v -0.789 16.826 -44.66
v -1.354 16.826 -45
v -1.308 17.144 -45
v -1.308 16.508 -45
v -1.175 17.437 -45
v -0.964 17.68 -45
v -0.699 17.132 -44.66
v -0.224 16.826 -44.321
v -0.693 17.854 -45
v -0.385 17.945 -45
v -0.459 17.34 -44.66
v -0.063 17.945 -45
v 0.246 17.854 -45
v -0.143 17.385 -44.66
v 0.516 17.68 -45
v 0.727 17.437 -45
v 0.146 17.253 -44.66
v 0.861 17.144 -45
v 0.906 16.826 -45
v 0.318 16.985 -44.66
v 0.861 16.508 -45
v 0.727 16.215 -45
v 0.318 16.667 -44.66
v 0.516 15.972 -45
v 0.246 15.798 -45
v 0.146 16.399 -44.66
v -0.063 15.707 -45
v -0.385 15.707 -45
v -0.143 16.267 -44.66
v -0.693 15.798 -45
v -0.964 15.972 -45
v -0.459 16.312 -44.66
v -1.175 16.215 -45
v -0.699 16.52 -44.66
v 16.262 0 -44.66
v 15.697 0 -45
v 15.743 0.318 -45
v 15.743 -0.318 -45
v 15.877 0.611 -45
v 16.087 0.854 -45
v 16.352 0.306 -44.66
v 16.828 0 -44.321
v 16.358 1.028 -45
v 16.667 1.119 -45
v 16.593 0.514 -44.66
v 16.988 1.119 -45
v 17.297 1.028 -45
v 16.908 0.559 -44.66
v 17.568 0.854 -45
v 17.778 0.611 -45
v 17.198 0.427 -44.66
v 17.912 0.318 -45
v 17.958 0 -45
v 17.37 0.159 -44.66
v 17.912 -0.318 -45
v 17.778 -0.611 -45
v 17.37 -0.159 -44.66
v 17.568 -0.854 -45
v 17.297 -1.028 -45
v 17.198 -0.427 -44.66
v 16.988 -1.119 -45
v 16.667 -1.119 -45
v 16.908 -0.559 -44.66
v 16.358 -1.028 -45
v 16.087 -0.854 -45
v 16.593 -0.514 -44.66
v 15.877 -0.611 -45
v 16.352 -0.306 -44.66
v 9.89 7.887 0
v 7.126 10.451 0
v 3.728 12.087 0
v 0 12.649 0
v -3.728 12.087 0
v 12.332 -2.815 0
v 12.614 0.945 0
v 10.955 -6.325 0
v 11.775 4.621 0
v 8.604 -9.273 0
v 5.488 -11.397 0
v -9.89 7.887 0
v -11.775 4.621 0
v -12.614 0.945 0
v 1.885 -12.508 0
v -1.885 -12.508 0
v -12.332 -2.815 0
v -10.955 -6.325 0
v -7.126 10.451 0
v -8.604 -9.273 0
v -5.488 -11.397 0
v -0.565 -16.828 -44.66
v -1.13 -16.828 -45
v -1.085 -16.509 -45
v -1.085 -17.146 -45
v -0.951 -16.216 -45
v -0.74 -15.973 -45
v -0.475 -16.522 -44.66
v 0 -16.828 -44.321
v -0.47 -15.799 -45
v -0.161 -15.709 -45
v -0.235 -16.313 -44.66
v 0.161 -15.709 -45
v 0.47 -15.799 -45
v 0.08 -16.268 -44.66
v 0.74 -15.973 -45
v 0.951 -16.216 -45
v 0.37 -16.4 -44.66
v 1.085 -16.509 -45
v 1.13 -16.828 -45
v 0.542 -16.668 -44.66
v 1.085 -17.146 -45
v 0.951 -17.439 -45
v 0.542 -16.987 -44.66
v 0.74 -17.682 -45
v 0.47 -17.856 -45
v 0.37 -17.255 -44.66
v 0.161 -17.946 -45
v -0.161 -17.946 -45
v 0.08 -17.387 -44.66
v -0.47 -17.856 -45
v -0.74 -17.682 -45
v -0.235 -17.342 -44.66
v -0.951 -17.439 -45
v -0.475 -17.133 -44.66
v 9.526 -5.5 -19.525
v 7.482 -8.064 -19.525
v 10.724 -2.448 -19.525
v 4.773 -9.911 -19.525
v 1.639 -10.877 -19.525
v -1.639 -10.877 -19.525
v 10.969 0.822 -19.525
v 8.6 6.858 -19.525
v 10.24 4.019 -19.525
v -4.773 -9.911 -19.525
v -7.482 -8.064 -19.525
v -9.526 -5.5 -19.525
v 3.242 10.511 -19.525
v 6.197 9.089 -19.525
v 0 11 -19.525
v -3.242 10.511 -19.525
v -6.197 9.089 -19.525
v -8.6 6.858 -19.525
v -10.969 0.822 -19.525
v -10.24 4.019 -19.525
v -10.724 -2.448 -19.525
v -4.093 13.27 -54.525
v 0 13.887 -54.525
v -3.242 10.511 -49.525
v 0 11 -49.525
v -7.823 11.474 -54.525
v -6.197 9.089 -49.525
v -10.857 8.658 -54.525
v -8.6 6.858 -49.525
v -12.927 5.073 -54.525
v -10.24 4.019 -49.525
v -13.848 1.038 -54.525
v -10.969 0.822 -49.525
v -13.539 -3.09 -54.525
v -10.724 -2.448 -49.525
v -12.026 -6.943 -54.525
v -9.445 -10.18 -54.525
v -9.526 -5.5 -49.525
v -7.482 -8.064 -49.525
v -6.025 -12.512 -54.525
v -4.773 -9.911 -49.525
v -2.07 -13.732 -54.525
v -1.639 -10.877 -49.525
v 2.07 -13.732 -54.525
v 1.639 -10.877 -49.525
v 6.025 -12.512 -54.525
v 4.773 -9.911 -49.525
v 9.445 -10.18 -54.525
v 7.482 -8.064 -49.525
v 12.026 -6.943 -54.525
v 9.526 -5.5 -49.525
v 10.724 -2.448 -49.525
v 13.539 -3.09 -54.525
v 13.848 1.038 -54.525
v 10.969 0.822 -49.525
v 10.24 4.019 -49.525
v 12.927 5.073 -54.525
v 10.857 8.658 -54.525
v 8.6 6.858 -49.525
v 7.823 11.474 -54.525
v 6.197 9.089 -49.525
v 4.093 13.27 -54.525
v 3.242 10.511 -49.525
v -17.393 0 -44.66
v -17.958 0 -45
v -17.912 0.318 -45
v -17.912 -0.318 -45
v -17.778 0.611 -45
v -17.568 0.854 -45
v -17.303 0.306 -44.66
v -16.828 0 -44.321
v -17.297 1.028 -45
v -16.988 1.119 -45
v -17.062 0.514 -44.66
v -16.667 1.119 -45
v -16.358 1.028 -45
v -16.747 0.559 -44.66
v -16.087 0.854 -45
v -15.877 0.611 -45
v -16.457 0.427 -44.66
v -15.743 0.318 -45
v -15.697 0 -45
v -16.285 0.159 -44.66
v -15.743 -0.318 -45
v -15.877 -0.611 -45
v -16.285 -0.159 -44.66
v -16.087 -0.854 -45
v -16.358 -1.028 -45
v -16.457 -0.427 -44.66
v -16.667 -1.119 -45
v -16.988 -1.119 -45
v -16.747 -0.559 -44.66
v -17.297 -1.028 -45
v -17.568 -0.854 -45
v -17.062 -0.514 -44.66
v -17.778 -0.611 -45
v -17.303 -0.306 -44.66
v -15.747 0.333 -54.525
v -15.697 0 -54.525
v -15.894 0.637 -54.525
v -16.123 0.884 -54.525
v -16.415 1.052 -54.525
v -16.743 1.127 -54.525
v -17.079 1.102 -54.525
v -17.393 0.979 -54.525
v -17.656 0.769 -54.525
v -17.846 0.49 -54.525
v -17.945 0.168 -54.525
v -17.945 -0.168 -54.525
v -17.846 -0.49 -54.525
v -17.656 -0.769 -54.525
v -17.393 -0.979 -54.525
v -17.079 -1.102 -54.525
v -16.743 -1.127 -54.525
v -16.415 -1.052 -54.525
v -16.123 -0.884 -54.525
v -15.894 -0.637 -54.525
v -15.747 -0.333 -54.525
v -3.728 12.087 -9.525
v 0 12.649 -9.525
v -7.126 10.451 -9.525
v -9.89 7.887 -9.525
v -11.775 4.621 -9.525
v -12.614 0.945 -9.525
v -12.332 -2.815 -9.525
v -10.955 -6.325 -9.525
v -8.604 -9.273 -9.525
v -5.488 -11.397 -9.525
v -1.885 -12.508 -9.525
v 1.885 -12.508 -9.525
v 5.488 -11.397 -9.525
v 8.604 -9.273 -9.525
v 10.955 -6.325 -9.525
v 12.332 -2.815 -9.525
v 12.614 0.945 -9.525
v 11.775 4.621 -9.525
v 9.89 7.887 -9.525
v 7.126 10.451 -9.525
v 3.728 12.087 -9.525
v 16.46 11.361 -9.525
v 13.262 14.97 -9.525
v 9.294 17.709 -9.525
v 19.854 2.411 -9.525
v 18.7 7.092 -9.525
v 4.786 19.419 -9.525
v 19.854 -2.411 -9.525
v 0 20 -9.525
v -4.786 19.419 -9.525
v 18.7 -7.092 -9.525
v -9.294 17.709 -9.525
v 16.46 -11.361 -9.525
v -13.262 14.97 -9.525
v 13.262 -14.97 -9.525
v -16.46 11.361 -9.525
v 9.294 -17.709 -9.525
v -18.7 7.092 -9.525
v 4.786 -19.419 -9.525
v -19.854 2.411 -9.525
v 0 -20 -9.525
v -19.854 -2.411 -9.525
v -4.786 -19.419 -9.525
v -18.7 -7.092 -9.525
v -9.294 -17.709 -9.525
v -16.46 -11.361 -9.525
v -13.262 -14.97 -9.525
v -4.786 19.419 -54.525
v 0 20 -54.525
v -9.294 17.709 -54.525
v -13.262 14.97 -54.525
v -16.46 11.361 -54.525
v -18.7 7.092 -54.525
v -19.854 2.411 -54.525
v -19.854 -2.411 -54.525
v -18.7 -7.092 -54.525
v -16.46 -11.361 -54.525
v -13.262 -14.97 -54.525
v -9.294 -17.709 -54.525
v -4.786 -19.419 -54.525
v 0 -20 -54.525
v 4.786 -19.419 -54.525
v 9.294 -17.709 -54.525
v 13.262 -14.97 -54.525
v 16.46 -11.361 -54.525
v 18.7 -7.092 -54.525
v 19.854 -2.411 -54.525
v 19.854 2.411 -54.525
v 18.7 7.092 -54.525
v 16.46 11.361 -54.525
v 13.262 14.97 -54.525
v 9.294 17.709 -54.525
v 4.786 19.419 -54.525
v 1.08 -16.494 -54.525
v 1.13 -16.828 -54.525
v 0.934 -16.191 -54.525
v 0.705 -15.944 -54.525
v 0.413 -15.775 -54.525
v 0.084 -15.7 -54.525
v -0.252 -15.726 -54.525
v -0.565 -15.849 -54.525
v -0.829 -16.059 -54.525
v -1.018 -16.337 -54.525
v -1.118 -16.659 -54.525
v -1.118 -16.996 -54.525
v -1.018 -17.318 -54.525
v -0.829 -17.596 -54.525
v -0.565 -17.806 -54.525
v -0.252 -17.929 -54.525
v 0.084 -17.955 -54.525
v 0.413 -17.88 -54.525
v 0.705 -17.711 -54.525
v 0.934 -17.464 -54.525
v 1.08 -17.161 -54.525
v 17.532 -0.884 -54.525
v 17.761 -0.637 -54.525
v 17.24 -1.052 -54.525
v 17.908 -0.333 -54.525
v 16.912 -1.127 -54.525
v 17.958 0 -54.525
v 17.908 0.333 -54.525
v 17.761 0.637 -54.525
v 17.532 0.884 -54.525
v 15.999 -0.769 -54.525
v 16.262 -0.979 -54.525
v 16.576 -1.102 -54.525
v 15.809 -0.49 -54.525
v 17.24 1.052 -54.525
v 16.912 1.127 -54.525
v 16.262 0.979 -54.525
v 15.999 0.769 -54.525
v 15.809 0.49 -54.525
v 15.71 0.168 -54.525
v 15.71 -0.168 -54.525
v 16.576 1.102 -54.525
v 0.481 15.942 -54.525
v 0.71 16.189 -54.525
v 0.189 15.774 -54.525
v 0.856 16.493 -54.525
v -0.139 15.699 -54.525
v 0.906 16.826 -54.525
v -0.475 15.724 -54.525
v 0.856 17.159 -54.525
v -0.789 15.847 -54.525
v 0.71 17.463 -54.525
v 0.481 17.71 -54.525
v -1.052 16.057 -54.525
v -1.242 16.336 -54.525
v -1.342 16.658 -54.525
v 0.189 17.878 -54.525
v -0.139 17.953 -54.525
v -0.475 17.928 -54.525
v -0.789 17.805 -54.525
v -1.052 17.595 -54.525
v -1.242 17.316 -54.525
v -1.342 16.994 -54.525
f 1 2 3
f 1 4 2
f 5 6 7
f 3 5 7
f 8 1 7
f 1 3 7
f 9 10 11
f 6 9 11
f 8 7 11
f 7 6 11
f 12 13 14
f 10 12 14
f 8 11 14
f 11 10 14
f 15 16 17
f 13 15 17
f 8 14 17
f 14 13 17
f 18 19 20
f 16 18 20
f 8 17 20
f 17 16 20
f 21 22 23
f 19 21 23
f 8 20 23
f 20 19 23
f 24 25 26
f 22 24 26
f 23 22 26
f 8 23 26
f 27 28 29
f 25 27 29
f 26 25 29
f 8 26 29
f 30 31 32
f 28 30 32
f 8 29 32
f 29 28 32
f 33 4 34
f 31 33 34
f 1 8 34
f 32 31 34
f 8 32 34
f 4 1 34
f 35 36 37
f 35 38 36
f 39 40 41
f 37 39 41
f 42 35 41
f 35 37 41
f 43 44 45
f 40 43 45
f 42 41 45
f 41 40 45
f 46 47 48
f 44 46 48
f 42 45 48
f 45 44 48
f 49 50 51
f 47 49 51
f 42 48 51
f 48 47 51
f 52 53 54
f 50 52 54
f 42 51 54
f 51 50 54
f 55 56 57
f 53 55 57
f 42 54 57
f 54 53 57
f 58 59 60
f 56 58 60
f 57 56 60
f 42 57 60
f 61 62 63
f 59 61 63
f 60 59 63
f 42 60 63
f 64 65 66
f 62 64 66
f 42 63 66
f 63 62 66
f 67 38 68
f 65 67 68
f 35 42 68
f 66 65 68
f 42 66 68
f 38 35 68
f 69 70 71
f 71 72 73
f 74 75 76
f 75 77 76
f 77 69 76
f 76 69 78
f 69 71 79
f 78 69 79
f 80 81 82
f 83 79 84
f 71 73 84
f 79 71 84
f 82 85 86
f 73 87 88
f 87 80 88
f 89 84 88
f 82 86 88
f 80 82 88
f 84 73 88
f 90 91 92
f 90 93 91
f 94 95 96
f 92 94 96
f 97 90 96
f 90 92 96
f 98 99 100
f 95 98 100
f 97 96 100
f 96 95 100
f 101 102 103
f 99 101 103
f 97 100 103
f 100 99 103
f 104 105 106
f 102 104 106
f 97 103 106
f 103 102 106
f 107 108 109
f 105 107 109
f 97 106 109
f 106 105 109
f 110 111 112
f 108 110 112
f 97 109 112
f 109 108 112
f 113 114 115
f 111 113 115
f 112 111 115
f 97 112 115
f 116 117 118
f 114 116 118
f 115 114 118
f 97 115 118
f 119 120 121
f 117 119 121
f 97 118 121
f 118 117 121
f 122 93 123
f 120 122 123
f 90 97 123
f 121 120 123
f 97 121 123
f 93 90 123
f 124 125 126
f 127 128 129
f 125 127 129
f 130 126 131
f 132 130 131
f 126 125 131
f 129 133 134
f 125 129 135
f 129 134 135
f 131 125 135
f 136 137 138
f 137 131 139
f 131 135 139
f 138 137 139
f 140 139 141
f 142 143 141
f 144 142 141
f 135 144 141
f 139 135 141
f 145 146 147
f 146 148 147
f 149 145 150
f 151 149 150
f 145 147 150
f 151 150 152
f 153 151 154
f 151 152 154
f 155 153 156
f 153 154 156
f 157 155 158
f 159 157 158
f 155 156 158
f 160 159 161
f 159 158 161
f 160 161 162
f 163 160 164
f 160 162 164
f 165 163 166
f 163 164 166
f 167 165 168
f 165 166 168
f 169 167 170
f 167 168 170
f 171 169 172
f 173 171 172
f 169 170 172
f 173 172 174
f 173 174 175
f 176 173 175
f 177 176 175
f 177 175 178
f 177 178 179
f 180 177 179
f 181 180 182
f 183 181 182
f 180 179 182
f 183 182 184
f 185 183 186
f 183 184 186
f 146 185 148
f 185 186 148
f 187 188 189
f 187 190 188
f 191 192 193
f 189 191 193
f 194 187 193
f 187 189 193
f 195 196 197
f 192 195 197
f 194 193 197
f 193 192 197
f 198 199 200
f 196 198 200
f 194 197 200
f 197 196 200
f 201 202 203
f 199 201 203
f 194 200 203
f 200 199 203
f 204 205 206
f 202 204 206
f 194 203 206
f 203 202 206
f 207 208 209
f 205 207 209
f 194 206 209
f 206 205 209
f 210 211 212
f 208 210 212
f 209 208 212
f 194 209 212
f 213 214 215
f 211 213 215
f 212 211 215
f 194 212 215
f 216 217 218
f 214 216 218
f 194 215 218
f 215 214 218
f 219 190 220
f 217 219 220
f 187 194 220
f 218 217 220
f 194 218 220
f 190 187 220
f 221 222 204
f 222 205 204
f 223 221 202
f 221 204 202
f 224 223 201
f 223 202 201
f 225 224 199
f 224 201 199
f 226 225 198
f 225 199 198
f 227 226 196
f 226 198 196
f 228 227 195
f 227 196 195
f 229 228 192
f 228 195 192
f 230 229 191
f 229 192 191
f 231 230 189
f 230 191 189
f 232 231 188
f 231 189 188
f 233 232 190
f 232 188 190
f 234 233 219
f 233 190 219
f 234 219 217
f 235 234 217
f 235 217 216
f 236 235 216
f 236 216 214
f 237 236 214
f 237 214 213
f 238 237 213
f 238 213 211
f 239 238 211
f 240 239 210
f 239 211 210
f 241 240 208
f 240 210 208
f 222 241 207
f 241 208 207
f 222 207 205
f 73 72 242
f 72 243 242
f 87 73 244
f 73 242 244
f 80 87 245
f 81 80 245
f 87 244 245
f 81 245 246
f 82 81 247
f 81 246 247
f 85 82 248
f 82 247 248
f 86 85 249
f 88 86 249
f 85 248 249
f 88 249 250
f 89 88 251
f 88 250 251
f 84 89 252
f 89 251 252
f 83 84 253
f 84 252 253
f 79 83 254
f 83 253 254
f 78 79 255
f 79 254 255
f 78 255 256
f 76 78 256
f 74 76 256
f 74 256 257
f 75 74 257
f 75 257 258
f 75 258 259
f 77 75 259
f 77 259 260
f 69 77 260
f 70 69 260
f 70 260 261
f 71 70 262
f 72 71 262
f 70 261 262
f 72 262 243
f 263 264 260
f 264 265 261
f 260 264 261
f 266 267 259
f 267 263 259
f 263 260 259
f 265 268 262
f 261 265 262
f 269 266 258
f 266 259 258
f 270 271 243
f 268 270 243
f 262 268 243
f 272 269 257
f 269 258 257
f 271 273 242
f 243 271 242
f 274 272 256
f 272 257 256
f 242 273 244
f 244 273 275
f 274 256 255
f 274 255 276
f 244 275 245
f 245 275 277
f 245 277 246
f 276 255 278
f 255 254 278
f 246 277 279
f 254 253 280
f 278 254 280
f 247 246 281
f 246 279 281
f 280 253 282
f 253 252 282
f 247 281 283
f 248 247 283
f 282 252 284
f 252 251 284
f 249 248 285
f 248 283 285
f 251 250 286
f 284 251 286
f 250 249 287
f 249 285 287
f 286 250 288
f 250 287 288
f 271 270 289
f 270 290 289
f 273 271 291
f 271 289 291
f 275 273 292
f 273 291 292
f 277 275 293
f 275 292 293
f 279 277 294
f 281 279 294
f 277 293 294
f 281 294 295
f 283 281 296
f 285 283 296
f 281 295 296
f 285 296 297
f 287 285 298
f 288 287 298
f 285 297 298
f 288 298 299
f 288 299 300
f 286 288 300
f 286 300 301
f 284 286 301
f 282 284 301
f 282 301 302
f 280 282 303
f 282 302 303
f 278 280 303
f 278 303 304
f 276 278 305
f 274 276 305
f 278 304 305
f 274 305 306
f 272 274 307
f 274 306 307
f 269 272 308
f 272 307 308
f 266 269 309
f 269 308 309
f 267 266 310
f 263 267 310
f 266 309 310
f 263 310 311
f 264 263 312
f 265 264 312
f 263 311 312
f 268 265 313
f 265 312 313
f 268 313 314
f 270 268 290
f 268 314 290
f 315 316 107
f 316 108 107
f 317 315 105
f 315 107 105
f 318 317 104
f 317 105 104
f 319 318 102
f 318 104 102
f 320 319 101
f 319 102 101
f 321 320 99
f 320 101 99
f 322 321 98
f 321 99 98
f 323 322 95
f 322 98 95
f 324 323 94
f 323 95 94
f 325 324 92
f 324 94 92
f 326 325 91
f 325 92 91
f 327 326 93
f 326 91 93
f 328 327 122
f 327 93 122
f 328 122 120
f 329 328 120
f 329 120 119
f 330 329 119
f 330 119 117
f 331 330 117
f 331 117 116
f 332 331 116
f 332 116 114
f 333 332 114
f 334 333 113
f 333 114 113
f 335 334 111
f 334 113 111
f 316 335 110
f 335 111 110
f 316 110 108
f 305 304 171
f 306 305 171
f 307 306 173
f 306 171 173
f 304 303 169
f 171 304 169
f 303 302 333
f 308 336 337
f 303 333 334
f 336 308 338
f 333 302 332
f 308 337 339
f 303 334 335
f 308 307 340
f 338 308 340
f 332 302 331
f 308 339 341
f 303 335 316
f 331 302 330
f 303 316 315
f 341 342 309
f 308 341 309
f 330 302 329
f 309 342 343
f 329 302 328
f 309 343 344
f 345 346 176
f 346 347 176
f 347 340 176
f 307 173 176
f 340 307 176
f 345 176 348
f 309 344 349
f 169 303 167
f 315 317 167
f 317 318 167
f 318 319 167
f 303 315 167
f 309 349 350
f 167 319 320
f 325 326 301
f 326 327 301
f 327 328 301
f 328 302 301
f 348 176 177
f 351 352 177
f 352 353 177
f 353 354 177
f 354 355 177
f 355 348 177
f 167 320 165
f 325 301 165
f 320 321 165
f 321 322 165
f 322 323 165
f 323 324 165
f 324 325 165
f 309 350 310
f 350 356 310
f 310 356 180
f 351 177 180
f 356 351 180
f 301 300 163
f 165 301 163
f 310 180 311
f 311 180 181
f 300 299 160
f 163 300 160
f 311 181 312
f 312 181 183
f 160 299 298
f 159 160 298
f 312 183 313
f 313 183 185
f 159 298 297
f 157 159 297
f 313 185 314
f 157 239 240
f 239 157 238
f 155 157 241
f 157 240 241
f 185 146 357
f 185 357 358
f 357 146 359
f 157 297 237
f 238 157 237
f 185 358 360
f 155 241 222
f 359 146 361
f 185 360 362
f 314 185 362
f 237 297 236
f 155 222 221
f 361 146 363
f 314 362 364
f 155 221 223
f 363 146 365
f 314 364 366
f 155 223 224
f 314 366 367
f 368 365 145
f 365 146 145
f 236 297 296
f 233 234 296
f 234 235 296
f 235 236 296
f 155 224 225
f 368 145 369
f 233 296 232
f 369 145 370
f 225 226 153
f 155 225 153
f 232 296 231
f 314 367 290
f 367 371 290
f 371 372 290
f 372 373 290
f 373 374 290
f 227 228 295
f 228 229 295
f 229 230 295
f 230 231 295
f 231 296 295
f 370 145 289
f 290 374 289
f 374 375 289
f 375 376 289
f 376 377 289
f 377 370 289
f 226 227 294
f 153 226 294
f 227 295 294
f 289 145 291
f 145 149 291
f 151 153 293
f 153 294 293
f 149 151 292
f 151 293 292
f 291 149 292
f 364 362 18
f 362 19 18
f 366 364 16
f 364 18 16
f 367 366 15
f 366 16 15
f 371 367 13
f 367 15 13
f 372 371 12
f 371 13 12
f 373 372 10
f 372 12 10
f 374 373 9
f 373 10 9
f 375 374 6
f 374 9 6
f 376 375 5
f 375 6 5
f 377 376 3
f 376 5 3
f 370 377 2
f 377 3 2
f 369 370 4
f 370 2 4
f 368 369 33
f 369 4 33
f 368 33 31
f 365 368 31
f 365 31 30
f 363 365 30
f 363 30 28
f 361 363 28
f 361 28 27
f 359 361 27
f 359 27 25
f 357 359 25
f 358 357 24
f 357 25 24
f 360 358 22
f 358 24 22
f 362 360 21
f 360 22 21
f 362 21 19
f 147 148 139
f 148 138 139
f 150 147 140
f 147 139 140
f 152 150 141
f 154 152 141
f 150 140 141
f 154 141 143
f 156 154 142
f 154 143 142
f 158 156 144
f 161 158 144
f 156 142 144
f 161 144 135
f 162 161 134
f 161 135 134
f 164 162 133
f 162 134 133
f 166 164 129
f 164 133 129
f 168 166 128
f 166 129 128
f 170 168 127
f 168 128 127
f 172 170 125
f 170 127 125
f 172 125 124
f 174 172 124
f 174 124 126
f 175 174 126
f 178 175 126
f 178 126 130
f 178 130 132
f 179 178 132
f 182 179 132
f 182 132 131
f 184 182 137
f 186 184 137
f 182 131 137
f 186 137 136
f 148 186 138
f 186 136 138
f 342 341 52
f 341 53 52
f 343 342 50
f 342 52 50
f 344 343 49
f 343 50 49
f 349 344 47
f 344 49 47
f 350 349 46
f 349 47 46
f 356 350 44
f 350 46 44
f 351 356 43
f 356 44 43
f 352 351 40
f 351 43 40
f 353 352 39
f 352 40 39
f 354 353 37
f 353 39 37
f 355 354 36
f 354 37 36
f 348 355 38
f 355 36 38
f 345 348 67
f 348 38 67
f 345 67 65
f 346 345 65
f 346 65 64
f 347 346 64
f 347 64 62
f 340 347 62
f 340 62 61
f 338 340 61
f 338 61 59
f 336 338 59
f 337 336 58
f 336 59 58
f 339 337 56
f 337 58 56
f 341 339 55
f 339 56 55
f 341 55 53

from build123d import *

# Parameters (mm, degrees)
F_4_40_TAPPED_HOLE1_D     = 2.2606
F_4_40_TAPPED_HOLE1_DEPTH = 9.525
F_4_40_TAPPED_HOLE1_TIP   = 0.679152758


with BuildPart() as part:
    # Sketch1 → Revolve1 (revolve)
    with BuildSketch(Plane(origin=(0, 0, 0), x_dir=(0, 0, -1), z_dir=(1, 0, 0))):
        Polygon((0, 0), (0, 12.6492), (9.525, 12.6492), (9.525, 20), (54.525, 20), (54.525, 13.886751346), (49.525, 11), (19.525, 11), (19.525, 0), align=None)
    revolve(axis=Axis((0, 0, -19.525), (0, 0, 1)))

    # #4-40 Tapped Hole1
    with Locations(Plane(origin=(0, 0, -54.525), x_dir=(-1, 0, 0), z_dir=(0, 0, -1))):
        with Locations((16.8275, 0), (0.223849371, 16.826011046), (0, -16.8275), (-16.8275, 0)):
            Hole(F_4_40_TAPPED_HOLE1_D / 2, depth=F_4_40_TAPPED_HOLE1_DEPTH)
            with Locations((0, 0, -(F_4_40_TAPPED_HOLE1_DEPTH + F_4_40_TAPPED_HOLE1_TIP / 2))):  # 118° drill point
                Cone(0, F_4_40_TAPPED_HOLE1_D / 2, F_4_40_TAPPED_HOLE1_TIP, mode=Mode.SUBTRACT)


solid = part.part
